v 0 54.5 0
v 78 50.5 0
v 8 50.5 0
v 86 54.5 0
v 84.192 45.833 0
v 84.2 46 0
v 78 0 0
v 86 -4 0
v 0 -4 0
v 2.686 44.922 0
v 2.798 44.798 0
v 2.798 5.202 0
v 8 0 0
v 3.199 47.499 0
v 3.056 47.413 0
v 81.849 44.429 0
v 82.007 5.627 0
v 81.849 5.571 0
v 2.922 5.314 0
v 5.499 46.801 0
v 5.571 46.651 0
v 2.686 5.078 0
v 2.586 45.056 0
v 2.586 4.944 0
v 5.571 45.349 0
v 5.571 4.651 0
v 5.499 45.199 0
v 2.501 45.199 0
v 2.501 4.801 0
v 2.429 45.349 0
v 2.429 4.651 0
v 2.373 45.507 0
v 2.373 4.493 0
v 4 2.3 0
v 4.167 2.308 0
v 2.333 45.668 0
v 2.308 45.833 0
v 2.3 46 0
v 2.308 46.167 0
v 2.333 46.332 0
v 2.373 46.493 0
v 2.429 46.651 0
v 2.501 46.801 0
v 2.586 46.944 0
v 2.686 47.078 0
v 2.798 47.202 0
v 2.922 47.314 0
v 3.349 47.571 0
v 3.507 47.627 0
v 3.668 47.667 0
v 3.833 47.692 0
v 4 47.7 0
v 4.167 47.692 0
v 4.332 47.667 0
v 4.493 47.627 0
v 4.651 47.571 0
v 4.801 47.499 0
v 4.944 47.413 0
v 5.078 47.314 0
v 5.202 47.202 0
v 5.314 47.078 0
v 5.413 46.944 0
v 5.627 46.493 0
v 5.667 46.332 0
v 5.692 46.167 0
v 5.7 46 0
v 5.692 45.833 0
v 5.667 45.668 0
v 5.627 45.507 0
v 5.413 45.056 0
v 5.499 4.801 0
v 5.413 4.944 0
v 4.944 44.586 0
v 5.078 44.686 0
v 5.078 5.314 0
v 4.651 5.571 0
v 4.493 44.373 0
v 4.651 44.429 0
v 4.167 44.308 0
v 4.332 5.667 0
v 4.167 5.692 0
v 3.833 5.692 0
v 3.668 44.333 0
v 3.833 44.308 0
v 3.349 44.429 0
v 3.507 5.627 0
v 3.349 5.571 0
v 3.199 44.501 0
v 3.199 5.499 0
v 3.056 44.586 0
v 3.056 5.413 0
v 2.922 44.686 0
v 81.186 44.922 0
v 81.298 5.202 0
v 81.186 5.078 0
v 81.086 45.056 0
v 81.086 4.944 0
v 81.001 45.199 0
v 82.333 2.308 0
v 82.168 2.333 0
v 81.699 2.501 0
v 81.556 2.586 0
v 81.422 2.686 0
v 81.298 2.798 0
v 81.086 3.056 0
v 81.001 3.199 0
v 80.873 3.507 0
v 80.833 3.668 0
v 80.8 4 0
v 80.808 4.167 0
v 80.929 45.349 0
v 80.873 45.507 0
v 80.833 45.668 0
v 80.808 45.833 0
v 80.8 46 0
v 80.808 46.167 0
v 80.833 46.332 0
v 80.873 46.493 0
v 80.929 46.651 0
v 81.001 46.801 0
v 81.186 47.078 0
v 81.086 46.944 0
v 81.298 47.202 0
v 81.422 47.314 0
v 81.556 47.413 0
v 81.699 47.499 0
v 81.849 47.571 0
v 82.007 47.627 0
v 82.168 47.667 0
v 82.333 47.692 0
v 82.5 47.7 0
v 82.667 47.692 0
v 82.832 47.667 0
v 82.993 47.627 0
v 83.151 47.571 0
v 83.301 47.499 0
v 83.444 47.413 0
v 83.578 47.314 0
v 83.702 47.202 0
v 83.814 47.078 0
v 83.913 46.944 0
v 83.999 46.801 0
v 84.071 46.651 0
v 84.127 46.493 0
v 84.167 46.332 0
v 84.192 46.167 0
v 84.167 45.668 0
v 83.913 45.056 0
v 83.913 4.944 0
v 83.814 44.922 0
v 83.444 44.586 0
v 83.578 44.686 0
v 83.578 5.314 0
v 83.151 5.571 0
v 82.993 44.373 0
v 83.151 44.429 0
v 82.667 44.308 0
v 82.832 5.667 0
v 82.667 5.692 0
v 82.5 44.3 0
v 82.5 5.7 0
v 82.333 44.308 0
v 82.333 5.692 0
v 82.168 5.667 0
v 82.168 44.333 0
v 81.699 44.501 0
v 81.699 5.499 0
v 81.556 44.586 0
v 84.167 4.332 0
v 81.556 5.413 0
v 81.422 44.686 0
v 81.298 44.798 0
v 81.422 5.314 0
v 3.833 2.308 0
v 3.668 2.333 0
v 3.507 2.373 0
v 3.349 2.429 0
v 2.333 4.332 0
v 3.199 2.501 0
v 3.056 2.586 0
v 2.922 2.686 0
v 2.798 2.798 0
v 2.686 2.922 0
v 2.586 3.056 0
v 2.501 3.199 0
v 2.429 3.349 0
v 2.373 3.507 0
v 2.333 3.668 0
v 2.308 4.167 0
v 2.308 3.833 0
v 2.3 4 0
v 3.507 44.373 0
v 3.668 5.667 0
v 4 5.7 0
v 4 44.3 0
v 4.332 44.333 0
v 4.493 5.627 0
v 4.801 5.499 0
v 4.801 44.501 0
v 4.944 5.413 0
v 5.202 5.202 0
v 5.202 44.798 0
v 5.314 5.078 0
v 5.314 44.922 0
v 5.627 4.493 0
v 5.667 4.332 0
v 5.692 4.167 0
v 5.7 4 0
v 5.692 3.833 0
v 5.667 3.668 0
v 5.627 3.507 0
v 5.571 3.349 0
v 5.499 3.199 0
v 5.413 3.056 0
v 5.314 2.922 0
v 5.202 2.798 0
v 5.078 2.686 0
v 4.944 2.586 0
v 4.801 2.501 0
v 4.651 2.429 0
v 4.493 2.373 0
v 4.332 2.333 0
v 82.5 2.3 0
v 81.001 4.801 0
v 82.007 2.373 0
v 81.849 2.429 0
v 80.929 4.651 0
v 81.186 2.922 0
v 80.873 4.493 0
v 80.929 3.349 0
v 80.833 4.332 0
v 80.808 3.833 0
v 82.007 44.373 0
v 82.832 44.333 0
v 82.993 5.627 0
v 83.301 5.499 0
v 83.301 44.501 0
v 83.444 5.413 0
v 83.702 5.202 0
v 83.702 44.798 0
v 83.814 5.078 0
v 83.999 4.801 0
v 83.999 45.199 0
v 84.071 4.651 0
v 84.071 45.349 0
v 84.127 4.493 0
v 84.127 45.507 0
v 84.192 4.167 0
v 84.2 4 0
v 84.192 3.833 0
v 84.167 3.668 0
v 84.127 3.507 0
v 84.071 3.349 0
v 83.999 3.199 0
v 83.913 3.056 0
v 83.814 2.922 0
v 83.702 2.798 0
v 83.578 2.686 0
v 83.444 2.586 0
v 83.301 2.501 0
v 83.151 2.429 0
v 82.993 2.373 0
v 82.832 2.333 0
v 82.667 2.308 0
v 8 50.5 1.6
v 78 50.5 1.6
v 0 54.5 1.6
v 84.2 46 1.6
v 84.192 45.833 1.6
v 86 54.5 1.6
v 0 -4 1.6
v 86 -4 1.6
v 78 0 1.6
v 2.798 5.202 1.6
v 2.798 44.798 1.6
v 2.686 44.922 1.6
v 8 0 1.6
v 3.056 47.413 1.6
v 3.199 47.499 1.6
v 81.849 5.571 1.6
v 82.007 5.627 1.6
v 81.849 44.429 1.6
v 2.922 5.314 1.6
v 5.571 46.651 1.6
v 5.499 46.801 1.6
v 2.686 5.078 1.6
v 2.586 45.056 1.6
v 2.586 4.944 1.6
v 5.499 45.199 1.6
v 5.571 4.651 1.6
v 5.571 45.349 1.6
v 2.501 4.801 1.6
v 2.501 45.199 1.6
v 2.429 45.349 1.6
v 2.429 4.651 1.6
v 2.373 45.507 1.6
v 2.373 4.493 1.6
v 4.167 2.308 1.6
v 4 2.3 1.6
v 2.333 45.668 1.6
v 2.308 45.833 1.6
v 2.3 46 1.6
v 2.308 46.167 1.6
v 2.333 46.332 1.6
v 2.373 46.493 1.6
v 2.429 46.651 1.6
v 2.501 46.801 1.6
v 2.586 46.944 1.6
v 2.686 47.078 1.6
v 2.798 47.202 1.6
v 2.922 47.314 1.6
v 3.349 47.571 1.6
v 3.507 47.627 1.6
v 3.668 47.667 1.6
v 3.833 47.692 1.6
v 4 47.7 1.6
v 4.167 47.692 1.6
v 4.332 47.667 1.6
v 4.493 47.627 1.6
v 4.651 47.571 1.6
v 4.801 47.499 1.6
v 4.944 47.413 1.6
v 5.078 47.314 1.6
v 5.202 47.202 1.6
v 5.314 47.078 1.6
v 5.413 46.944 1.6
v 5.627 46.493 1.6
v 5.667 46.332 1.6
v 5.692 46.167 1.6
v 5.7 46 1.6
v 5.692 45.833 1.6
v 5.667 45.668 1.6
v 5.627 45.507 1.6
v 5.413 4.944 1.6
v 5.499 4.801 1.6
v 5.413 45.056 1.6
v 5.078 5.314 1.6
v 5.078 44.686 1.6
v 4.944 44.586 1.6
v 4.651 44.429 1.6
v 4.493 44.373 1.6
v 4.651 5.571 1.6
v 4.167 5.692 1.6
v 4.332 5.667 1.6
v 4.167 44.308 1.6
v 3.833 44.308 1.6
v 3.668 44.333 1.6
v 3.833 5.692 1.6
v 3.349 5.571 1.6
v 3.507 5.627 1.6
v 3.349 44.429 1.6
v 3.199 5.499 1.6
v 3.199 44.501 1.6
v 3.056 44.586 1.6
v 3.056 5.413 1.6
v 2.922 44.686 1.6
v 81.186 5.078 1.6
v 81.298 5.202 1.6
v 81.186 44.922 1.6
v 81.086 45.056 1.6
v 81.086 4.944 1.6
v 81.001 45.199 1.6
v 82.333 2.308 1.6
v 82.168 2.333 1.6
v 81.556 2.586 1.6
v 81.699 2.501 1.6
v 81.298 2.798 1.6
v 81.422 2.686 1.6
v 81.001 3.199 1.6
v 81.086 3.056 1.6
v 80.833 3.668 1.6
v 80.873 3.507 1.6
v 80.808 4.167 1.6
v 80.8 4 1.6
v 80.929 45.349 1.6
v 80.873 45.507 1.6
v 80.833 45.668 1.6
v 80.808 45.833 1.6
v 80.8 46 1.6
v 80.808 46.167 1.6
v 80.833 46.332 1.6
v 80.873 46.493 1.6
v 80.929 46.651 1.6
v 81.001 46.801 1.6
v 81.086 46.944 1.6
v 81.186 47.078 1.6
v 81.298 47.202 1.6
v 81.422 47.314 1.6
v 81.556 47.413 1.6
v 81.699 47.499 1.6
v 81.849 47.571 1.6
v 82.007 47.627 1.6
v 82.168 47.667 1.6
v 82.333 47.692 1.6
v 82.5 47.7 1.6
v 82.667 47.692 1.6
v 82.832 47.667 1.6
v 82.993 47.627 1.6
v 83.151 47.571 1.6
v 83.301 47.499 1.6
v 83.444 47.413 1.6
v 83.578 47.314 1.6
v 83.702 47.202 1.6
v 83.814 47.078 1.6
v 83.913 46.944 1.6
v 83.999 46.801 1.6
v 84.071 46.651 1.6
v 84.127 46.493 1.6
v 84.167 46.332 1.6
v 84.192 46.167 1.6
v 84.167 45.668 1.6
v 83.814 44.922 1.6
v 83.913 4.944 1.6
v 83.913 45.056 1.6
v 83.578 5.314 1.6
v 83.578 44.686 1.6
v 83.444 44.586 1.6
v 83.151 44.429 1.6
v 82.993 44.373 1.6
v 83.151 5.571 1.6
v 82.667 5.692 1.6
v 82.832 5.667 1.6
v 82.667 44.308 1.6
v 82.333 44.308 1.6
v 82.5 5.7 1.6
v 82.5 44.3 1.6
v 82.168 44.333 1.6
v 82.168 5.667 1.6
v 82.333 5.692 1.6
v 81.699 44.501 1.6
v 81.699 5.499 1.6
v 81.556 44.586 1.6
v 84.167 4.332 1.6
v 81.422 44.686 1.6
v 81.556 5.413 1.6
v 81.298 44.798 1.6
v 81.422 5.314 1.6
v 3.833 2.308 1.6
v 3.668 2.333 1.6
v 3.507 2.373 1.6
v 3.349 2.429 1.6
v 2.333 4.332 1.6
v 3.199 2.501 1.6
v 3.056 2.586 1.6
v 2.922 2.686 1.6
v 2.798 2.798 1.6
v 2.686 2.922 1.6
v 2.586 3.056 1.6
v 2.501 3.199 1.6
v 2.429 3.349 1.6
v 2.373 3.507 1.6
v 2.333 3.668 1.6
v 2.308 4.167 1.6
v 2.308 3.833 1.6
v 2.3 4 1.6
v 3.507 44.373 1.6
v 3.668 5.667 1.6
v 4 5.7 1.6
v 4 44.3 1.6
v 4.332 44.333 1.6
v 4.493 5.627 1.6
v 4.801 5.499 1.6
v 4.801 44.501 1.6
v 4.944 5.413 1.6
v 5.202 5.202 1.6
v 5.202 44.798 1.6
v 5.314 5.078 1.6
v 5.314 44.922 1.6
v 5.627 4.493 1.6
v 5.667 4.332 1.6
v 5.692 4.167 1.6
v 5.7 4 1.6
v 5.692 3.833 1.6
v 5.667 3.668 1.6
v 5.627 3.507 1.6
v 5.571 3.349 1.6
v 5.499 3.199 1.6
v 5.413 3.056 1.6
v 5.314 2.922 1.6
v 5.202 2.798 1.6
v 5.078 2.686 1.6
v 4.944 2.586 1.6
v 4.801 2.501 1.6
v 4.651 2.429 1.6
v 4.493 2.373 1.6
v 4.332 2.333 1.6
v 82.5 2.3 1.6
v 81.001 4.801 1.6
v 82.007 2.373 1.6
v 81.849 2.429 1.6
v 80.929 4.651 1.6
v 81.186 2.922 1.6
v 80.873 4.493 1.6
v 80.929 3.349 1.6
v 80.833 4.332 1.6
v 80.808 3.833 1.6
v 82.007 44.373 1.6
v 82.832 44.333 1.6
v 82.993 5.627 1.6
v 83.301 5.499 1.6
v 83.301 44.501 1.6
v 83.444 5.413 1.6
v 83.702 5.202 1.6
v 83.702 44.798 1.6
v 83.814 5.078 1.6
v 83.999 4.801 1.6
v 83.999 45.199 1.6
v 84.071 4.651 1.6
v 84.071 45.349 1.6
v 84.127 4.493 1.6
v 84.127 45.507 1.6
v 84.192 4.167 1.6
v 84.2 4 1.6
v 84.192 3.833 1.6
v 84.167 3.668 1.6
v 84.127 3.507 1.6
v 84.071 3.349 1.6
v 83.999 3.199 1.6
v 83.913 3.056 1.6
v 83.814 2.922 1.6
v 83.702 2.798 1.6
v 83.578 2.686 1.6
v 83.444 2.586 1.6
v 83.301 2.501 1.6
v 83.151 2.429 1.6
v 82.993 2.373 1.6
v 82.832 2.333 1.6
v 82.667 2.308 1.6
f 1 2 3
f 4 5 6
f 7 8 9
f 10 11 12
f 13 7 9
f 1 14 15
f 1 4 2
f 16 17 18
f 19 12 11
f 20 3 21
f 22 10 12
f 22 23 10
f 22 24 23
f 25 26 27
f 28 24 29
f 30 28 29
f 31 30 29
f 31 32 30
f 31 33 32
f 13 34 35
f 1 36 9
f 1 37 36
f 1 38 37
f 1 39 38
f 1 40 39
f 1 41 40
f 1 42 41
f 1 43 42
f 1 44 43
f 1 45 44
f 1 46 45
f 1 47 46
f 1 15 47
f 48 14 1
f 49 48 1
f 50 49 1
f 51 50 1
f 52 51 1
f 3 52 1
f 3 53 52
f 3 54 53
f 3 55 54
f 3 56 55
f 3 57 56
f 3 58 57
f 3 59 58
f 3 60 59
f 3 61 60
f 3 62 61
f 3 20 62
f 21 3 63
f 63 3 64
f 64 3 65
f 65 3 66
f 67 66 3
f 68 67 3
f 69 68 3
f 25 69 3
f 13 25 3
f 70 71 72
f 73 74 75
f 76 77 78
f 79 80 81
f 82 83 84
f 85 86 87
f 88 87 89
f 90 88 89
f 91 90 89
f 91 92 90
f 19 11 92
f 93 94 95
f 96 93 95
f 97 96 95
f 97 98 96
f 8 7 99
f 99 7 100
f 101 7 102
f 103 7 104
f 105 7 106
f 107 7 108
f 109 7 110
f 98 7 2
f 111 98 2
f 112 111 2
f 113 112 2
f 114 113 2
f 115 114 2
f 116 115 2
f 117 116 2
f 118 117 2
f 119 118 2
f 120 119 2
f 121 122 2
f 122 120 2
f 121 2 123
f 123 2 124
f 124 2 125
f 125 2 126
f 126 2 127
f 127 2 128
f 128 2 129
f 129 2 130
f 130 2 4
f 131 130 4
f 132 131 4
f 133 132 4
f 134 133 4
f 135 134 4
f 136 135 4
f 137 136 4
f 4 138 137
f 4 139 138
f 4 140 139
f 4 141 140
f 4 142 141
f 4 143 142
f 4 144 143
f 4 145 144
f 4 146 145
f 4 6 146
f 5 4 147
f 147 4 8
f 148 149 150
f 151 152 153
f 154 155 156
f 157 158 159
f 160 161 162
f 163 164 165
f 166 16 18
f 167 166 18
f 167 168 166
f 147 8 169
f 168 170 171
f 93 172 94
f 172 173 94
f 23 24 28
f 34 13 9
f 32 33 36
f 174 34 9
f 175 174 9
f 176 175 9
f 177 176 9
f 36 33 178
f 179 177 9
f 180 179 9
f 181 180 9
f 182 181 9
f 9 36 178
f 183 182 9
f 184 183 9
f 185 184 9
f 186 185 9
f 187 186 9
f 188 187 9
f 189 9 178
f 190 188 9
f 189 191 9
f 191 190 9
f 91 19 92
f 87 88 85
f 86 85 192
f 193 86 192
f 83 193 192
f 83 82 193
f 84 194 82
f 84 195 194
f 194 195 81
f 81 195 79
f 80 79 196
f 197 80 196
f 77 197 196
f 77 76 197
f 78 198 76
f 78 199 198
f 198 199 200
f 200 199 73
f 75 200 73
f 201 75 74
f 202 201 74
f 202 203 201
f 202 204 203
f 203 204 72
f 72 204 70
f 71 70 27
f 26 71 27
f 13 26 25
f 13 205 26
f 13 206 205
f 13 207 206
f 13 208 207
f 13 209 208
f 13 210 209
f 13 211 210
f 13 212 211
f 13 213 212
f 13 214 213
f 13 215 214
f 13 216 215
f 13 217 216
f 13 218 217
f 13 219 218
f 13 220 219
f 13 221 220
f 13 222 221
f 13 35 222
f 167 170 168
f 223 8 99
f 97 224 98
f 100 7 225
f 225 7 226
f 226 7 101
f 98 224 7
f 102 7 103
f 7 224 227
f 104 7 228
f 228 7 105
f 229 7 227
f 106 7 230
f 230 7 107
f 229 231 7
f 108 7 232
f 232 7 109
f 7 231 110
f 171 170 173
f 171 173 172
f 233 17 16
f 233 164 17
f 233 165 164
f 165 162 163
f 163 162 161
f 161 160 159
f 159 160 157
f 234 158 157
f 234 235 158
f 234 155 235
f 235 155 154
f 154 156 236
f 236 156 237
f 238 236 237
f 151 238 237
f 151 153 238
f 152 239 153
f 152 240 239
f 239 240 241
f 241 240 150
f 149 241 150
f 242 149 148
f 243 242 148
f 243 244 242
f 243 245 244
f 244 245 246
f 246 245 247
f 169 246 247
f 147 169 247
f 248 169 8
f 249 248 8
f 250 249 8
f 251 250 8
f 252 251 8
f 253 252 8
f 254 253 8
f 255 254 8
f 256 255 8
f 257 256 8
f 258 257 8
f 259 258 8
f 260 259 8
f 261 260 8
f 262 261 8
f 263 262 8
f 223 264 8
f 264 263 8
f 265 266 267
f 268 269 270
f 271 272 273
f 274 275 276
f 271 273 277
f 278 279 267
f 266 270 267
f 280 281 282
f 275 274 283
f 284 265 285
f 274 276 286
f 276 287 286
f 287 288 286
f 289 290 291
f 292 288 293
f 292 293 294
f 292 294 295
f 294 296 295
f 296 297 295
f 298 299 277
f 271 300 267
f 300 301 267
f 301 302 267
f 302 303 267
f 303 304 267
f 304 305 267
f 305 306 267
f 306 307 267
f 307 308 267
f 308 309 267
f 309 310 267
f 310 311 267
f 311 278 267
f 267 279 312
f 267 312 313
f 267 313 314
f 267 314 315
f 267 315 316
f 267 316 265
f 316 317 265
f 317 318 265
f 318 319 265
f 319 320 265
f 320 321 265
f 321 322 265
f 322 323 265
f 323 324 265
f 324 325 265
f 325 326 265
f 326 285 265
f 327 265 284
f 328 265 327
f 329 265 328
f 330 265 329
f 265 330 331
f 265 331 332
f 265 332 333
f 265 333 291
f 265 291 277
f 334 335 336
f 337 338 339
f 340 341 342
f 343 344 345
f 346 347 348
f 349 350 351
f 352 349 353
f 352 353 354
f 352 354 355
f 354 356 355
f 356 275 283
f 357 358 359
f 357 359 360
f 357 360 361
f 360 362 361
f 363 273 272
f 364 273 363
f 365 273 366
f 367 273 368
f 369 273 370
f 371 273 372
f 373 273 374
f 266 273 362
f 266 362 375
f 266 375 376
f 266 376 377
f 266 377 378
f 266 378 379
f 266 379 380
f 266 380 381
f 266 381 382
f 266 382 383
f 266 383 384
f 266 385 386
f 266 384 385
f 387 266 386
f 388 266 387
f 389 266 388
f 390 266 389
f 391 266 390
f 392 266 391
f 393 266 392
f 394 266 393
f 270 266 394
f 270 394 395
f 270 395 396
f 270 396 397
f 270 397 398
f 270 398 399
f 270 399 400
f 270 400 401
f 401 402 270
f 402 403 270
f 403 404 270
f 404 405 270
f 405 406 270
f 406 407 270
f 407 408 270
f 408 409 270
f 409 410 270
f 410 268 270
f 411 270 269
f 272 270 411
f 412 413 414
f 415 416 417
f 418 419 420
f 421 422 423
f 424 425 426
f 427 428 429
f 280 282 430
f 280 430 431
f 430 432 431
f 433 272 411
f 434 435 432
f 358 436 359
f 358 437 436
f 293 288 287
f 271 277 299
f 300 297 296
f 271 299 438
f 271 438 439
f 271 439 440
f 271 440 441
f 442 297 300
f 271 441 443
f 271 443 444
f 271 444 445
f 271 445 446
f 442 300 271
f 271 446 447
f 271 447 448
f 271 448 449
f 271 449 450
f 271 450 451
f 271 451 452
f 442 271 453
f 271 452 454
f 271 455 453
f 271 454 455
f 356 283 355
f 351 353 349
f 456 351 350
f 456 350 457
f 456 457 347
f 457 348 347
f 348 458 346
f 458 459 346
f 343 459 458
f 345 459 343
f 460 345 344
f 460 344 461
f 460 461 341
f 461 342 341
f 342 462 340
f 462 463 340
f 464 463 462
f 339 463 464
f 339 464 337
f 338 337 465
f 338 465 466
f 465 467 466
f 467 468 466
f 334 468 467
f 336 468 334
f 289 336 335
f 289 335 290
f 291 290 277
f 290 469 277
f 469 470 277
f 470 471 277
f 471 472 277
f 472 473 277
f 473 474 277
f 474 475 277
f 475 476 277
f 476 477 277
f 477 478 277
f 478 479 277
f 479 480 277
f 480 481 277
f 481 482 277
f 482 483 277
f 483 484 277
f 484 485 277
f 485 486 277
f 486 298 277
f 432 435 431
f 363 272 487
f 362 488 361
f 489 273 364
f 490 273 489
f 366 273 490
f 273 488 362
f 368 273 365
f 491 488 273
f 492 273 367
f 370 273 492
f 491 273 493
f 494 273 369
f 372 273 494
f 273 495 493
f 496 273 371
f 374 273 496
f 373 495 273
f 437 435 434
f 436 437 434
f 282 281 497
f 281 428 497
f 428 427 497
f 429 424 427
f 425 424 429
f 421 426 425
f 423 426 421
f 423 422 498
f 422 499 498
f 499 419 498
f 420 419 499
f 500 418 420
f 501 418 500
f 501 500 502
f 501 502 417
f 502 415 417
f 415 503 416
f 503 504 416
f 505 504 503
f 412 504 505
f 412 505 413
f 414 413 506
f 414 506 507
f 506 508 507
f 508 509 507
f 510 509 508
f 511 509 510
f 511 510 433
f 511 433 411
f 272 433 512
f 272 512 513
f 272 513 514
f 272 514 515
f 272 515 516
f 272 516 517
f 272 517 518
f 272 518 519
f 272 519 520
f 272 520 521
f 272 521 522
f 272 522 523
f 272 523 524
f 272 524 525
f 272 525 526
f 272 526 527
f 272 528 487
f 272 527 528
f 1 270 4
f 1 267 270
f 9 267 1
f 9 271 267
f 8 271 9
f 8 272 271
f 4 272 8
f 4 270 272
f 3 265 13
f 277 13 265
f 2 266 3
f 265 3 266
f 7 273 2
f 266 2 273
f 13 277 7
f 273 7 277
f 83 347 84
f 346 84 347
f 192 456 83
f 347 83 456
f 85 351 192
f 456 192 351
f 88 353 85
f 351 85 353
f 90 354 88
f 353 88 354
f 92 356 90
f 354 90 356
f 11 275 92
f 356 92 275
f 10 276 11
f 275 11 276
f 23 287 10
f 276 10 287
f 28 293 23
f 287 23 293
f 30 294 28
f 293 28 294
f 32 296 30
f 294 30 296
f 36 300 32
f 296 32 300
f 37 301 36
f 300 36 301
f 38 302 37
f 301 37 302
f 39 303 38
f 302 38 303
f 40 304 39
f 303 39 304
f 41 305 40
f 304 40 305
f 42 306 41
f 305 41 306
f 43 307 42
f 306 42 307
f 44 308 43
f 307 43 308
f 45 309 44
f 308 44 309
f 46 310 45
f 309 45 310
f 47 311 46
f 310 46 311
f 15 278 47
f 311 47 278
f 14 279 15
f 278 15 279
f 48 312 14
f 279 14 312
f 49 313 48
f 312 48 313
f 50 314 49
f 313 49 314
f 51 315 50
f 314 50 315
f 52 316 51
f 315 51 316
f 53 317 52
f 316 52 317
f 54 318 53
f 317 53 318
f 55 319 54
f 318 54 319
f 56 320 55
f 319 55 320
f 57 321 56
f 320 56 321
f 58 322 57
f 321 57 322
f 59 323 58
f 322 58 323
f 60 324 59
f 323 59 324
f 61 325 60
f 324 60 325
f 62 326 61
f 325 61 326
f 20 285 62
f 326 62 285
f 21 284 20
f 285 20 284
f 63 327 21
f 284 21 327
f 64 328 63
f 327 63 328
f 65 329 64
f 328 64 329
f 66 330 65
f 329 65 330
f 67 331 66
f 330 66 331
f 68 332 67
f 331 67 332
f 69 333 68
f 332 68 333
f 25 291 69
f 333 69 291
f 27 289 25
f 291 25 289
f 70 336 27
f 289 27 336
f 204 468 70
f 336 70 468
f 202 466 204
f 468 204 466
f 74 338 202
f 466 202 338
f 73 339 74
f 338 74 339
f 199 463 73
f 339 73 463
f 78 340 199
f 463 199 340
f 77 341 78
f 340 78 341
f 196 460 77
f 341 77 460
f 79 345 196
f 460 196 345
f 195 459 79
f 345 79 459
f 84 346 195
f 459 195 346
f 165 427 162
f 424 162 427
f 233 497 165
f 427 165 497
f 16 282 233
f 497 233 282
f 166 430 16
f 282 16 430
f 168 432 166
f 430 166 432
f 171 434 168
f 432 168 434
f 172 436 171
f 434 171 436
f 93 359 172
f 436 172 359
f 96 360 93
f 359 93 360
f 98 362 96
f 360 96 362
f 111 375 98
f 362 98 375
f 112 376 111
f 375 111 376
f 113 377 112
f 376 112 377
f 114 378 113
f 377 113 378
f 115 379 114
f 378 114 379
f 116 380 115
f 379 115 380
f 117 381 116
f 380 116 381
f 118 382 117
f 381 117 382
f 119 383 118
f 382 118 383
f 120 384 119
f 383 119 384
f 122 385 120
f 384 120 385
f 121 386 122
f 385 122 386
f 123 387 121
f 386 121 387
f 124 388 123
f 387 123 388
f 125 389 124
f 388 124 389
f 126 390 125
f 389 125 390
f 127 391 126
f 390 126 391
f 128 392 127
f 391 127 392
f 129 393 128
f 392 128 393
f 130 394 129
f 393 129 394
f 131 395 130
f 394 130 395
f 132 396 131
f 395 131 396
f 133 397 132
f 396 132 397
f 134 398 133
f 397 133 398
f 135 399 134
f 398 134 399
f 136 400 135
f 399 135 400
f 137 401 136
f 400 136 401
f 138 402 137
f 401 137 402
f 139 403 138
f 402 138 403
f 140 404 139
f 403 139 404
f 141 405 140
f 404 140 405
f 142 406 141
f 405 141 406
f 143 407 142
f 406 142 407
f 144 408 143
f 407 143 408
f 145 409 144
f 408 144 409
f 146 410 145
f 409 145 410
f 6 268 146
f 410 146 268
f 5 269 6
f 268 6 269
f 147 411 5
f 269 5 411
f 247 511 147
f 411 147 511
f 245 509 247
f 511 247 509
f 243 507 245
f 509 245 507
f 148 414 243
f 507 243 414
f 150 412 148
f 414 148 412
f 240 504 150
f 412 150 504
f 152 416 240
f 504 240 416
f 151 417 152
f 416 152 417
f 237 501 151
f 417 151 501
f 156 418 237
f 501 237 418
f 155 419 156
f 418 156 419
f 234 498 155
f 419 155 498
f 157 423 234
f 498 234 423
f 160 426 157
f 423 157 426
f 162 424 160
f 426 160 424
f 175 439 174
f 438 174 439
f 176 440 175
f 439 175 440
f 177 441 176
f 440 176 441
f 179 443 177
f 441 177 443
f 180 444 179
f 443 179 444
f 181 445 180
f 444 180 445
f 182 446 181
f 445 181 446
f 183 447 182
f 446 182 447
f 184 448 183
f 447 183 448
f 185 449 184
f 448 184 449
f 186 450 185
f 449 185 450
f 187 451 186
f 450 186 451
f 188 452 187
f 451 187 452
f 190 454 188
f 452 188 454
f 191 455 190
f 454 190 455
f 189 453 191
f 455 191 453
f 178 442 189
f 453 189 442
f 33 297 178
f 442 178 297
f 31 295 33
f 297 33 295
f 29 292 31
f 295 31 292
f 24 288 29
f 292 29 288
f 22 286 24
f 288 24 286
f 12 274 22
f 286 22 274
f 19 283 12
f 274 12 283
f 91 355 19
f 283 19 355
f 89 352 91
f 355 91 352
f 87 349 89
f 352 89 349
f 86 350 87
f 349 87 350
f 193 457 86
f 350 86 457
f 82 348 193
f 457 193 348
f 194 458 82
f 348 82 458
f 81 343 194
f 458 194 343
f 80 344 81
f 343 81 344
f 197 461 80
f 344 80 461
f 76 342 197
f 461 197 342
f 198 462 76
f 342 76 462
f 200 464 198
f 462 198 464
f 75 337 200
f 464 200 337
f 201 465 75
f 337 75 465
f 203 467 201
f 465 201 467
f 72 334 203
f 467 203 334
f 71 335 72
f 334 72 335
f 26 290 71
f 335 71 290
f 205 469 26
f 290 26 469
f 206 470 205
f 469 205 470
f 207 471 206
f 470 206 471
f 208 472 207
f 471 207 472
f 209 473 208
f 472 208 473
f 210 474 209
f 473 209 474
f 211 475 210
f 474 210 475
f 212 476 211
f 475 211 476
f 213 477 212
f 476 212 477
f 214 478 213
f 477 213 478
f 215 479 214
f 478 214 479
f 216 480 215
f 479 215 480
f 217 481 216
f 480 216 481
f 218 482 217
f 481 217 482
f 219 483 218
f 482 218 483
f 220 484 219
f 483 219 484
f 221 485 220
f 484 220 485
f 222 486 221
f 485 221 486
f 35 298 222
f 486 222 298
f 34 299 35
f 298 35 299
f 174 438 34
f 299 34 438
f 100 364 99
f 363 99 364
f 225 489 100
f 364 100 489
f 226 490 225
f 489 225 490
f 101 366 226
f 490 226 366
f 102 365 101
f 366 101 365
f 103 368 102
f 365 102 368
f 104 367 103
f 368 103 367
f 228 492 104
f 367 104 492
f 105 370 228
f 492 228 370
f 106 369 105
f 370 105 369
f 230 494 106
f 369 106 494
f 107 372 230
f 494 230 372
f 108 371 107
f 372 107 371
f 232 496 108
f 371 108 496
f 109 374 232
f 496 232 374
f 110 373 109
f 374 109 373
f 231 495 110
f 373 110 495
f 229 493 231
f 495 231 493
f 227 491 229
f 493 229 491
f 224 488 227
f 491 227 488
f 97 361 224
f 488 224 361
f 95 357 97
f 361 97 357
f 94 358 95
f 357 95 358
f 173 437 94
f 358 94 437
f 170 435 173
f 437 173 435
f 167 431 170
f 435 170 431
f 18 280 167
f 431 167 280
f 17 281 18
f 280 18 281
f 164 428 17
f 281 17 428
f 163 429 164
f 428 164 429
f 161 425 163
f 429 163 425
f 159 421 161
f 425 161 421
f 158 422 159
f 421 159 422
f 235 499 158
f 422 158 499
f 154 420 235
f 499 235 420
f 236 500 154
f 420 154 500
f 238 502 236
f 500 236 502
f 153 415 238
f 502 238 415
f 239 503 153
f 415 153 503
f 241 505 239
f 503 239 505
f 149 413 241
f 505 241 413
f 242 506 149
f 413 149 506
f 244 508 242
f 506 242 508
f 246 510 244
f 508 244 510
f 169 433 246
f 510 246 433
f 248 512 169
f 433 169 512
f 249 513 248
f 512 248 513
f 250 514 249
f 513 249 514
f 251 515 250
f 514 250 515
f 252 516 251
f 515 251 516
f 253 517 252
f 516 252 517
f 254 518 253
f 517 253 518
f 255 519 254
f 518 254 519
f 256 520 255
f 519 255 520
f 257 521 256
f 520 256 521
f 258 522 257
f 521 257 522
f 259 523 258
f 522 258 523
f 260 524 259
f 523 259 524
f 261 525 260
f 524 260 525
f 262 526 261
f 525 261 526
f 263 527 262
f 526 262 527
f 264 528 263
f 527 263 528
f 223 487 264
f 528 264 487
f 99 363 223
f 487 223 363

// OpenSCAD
// file: cyd_dimensions.scad
// ESP32-2432S028R reference based on physical board measurements, millimeters.
// Coordinate origin: lower-left PCB corner viewed from the display side.
// X follows the 86 mm edge, Y follows the 50.5 mm edge; +Z faces the display.
// Nominal reference values; see verification flags for measurements on this unit.
// Measured edge-to-edge on a sample board; overrides manufacturer 86 x 50.
pcb_width = 86.0;
pcb_height = 50.5;
pcb_outline_verified = true;
mount_hole_diameter = 3.2;
// Four-hole layout accepted after a successful physical alignment print.
// Right margin 3.5 and top margin 4.5, not all margins 4.
mount_origin = [4,4];
mount_hole_centers = [for (y = [0,42]) for (x = [0,78.5])
                     [mount_origin[0]+x,mount_origin[1]+y]];
active_display_size = [57.6,43.2]; // Illuminated area ONLY, not frame size.
// Earlier 70 x 51 frame / flush edges conflict with latest PCB measurements.
display_frame_outline = undef;
display_frame_xy = undef;
display_frame_outline_verified = false;

// Corrected hole center spacing from a physical sample board.
mount_center_spacing = [78.5,42.0];
mount_center_spacing_verified = true;
// Spacing confirmation alone does not measure diameter or offsets from PCB edges.
mount_edge_offsets_verified = true; // Physical gauge fit, not caliper precision.
mount_hole_diameter_verified = false;
mounting_pattern_verified = mount_center_spacing_verified &&
                            mount_edge_offsets_verified && mount_hole_diameter_verified;

// Leave these undefined until verified on the actual dual-USB board.
pcb_thickness = 1.0;
glass_above_pcb_front = 4.0;
fit_test_opening = [70.0,50.5]; // Accepted opening; not a glass precision measurement.
fit_test_opening_xy = [8.0,0.0];
display_frame_size = undef;       // [width,height,depth]
display_frame_position = undef;   // [x,y,z] lower-left/back of outer frame
active_display_position = undef;  // [x,y,z] lower-left of illuminated area
total_assembly_thickness = 11.0;
assembly_z_min = -6.0; // PCB + rear components = 7 mm; PCB itself = 1 mm.

// Each opening is [x,y,z,width,height,depth] in board coordinates.
// Include plug/finger/card travel clearance when sizing enclosure cutouts.
usb_c_cutout = undef;
micro_usb_cutout = undef;
microsd_access = undef;
boot_button_access = undef;
reset_button_access = undef;
// main file
// Flat outline/hole alignment gauge, millimeters. Not a board mounting carrier.
include <cyd_dimensions.scad>
$fn = 64;
test_thickness = 1.6;
side_rail_width = 8;
outside_bridge_width = 4;
test_hole_diameter = 3.4; // 0.2 mm over nominal; printed clearance is approximate.
assert(pcb_width > 2*side_rail_width);
assert(test_thickness > 0 && test_hole_diameter > 0);
linear_extrude(height = test_thickness)
    difference() {
        // Top/bottom bridges sit OUTSIDE the PCB so they do not cover the display.
        translate([0,-outside_bridge_width])
            square([pcb_width,pcb_height+2*outside_bridge_width]);
        translate([side_rail_width,0])
            square([pcb_width-2*side_rail_width,pcb_height]);
        for (p = mount_hole_centers)
            translate(p) circle(d = test_hole_diameter);
    }
echo("Test outline:", [pcb_width,pcb_height], "hole centers:", mount_hole_centers);
echo("Provisional left/bottom offsets 4 mm. Derived right 3.5, top 4.5 mm.");
echo("Opening:", [pcb_width-2*side_rail_width,pcb_height],
     "with top/bottom bridges outside PCB outline.");
